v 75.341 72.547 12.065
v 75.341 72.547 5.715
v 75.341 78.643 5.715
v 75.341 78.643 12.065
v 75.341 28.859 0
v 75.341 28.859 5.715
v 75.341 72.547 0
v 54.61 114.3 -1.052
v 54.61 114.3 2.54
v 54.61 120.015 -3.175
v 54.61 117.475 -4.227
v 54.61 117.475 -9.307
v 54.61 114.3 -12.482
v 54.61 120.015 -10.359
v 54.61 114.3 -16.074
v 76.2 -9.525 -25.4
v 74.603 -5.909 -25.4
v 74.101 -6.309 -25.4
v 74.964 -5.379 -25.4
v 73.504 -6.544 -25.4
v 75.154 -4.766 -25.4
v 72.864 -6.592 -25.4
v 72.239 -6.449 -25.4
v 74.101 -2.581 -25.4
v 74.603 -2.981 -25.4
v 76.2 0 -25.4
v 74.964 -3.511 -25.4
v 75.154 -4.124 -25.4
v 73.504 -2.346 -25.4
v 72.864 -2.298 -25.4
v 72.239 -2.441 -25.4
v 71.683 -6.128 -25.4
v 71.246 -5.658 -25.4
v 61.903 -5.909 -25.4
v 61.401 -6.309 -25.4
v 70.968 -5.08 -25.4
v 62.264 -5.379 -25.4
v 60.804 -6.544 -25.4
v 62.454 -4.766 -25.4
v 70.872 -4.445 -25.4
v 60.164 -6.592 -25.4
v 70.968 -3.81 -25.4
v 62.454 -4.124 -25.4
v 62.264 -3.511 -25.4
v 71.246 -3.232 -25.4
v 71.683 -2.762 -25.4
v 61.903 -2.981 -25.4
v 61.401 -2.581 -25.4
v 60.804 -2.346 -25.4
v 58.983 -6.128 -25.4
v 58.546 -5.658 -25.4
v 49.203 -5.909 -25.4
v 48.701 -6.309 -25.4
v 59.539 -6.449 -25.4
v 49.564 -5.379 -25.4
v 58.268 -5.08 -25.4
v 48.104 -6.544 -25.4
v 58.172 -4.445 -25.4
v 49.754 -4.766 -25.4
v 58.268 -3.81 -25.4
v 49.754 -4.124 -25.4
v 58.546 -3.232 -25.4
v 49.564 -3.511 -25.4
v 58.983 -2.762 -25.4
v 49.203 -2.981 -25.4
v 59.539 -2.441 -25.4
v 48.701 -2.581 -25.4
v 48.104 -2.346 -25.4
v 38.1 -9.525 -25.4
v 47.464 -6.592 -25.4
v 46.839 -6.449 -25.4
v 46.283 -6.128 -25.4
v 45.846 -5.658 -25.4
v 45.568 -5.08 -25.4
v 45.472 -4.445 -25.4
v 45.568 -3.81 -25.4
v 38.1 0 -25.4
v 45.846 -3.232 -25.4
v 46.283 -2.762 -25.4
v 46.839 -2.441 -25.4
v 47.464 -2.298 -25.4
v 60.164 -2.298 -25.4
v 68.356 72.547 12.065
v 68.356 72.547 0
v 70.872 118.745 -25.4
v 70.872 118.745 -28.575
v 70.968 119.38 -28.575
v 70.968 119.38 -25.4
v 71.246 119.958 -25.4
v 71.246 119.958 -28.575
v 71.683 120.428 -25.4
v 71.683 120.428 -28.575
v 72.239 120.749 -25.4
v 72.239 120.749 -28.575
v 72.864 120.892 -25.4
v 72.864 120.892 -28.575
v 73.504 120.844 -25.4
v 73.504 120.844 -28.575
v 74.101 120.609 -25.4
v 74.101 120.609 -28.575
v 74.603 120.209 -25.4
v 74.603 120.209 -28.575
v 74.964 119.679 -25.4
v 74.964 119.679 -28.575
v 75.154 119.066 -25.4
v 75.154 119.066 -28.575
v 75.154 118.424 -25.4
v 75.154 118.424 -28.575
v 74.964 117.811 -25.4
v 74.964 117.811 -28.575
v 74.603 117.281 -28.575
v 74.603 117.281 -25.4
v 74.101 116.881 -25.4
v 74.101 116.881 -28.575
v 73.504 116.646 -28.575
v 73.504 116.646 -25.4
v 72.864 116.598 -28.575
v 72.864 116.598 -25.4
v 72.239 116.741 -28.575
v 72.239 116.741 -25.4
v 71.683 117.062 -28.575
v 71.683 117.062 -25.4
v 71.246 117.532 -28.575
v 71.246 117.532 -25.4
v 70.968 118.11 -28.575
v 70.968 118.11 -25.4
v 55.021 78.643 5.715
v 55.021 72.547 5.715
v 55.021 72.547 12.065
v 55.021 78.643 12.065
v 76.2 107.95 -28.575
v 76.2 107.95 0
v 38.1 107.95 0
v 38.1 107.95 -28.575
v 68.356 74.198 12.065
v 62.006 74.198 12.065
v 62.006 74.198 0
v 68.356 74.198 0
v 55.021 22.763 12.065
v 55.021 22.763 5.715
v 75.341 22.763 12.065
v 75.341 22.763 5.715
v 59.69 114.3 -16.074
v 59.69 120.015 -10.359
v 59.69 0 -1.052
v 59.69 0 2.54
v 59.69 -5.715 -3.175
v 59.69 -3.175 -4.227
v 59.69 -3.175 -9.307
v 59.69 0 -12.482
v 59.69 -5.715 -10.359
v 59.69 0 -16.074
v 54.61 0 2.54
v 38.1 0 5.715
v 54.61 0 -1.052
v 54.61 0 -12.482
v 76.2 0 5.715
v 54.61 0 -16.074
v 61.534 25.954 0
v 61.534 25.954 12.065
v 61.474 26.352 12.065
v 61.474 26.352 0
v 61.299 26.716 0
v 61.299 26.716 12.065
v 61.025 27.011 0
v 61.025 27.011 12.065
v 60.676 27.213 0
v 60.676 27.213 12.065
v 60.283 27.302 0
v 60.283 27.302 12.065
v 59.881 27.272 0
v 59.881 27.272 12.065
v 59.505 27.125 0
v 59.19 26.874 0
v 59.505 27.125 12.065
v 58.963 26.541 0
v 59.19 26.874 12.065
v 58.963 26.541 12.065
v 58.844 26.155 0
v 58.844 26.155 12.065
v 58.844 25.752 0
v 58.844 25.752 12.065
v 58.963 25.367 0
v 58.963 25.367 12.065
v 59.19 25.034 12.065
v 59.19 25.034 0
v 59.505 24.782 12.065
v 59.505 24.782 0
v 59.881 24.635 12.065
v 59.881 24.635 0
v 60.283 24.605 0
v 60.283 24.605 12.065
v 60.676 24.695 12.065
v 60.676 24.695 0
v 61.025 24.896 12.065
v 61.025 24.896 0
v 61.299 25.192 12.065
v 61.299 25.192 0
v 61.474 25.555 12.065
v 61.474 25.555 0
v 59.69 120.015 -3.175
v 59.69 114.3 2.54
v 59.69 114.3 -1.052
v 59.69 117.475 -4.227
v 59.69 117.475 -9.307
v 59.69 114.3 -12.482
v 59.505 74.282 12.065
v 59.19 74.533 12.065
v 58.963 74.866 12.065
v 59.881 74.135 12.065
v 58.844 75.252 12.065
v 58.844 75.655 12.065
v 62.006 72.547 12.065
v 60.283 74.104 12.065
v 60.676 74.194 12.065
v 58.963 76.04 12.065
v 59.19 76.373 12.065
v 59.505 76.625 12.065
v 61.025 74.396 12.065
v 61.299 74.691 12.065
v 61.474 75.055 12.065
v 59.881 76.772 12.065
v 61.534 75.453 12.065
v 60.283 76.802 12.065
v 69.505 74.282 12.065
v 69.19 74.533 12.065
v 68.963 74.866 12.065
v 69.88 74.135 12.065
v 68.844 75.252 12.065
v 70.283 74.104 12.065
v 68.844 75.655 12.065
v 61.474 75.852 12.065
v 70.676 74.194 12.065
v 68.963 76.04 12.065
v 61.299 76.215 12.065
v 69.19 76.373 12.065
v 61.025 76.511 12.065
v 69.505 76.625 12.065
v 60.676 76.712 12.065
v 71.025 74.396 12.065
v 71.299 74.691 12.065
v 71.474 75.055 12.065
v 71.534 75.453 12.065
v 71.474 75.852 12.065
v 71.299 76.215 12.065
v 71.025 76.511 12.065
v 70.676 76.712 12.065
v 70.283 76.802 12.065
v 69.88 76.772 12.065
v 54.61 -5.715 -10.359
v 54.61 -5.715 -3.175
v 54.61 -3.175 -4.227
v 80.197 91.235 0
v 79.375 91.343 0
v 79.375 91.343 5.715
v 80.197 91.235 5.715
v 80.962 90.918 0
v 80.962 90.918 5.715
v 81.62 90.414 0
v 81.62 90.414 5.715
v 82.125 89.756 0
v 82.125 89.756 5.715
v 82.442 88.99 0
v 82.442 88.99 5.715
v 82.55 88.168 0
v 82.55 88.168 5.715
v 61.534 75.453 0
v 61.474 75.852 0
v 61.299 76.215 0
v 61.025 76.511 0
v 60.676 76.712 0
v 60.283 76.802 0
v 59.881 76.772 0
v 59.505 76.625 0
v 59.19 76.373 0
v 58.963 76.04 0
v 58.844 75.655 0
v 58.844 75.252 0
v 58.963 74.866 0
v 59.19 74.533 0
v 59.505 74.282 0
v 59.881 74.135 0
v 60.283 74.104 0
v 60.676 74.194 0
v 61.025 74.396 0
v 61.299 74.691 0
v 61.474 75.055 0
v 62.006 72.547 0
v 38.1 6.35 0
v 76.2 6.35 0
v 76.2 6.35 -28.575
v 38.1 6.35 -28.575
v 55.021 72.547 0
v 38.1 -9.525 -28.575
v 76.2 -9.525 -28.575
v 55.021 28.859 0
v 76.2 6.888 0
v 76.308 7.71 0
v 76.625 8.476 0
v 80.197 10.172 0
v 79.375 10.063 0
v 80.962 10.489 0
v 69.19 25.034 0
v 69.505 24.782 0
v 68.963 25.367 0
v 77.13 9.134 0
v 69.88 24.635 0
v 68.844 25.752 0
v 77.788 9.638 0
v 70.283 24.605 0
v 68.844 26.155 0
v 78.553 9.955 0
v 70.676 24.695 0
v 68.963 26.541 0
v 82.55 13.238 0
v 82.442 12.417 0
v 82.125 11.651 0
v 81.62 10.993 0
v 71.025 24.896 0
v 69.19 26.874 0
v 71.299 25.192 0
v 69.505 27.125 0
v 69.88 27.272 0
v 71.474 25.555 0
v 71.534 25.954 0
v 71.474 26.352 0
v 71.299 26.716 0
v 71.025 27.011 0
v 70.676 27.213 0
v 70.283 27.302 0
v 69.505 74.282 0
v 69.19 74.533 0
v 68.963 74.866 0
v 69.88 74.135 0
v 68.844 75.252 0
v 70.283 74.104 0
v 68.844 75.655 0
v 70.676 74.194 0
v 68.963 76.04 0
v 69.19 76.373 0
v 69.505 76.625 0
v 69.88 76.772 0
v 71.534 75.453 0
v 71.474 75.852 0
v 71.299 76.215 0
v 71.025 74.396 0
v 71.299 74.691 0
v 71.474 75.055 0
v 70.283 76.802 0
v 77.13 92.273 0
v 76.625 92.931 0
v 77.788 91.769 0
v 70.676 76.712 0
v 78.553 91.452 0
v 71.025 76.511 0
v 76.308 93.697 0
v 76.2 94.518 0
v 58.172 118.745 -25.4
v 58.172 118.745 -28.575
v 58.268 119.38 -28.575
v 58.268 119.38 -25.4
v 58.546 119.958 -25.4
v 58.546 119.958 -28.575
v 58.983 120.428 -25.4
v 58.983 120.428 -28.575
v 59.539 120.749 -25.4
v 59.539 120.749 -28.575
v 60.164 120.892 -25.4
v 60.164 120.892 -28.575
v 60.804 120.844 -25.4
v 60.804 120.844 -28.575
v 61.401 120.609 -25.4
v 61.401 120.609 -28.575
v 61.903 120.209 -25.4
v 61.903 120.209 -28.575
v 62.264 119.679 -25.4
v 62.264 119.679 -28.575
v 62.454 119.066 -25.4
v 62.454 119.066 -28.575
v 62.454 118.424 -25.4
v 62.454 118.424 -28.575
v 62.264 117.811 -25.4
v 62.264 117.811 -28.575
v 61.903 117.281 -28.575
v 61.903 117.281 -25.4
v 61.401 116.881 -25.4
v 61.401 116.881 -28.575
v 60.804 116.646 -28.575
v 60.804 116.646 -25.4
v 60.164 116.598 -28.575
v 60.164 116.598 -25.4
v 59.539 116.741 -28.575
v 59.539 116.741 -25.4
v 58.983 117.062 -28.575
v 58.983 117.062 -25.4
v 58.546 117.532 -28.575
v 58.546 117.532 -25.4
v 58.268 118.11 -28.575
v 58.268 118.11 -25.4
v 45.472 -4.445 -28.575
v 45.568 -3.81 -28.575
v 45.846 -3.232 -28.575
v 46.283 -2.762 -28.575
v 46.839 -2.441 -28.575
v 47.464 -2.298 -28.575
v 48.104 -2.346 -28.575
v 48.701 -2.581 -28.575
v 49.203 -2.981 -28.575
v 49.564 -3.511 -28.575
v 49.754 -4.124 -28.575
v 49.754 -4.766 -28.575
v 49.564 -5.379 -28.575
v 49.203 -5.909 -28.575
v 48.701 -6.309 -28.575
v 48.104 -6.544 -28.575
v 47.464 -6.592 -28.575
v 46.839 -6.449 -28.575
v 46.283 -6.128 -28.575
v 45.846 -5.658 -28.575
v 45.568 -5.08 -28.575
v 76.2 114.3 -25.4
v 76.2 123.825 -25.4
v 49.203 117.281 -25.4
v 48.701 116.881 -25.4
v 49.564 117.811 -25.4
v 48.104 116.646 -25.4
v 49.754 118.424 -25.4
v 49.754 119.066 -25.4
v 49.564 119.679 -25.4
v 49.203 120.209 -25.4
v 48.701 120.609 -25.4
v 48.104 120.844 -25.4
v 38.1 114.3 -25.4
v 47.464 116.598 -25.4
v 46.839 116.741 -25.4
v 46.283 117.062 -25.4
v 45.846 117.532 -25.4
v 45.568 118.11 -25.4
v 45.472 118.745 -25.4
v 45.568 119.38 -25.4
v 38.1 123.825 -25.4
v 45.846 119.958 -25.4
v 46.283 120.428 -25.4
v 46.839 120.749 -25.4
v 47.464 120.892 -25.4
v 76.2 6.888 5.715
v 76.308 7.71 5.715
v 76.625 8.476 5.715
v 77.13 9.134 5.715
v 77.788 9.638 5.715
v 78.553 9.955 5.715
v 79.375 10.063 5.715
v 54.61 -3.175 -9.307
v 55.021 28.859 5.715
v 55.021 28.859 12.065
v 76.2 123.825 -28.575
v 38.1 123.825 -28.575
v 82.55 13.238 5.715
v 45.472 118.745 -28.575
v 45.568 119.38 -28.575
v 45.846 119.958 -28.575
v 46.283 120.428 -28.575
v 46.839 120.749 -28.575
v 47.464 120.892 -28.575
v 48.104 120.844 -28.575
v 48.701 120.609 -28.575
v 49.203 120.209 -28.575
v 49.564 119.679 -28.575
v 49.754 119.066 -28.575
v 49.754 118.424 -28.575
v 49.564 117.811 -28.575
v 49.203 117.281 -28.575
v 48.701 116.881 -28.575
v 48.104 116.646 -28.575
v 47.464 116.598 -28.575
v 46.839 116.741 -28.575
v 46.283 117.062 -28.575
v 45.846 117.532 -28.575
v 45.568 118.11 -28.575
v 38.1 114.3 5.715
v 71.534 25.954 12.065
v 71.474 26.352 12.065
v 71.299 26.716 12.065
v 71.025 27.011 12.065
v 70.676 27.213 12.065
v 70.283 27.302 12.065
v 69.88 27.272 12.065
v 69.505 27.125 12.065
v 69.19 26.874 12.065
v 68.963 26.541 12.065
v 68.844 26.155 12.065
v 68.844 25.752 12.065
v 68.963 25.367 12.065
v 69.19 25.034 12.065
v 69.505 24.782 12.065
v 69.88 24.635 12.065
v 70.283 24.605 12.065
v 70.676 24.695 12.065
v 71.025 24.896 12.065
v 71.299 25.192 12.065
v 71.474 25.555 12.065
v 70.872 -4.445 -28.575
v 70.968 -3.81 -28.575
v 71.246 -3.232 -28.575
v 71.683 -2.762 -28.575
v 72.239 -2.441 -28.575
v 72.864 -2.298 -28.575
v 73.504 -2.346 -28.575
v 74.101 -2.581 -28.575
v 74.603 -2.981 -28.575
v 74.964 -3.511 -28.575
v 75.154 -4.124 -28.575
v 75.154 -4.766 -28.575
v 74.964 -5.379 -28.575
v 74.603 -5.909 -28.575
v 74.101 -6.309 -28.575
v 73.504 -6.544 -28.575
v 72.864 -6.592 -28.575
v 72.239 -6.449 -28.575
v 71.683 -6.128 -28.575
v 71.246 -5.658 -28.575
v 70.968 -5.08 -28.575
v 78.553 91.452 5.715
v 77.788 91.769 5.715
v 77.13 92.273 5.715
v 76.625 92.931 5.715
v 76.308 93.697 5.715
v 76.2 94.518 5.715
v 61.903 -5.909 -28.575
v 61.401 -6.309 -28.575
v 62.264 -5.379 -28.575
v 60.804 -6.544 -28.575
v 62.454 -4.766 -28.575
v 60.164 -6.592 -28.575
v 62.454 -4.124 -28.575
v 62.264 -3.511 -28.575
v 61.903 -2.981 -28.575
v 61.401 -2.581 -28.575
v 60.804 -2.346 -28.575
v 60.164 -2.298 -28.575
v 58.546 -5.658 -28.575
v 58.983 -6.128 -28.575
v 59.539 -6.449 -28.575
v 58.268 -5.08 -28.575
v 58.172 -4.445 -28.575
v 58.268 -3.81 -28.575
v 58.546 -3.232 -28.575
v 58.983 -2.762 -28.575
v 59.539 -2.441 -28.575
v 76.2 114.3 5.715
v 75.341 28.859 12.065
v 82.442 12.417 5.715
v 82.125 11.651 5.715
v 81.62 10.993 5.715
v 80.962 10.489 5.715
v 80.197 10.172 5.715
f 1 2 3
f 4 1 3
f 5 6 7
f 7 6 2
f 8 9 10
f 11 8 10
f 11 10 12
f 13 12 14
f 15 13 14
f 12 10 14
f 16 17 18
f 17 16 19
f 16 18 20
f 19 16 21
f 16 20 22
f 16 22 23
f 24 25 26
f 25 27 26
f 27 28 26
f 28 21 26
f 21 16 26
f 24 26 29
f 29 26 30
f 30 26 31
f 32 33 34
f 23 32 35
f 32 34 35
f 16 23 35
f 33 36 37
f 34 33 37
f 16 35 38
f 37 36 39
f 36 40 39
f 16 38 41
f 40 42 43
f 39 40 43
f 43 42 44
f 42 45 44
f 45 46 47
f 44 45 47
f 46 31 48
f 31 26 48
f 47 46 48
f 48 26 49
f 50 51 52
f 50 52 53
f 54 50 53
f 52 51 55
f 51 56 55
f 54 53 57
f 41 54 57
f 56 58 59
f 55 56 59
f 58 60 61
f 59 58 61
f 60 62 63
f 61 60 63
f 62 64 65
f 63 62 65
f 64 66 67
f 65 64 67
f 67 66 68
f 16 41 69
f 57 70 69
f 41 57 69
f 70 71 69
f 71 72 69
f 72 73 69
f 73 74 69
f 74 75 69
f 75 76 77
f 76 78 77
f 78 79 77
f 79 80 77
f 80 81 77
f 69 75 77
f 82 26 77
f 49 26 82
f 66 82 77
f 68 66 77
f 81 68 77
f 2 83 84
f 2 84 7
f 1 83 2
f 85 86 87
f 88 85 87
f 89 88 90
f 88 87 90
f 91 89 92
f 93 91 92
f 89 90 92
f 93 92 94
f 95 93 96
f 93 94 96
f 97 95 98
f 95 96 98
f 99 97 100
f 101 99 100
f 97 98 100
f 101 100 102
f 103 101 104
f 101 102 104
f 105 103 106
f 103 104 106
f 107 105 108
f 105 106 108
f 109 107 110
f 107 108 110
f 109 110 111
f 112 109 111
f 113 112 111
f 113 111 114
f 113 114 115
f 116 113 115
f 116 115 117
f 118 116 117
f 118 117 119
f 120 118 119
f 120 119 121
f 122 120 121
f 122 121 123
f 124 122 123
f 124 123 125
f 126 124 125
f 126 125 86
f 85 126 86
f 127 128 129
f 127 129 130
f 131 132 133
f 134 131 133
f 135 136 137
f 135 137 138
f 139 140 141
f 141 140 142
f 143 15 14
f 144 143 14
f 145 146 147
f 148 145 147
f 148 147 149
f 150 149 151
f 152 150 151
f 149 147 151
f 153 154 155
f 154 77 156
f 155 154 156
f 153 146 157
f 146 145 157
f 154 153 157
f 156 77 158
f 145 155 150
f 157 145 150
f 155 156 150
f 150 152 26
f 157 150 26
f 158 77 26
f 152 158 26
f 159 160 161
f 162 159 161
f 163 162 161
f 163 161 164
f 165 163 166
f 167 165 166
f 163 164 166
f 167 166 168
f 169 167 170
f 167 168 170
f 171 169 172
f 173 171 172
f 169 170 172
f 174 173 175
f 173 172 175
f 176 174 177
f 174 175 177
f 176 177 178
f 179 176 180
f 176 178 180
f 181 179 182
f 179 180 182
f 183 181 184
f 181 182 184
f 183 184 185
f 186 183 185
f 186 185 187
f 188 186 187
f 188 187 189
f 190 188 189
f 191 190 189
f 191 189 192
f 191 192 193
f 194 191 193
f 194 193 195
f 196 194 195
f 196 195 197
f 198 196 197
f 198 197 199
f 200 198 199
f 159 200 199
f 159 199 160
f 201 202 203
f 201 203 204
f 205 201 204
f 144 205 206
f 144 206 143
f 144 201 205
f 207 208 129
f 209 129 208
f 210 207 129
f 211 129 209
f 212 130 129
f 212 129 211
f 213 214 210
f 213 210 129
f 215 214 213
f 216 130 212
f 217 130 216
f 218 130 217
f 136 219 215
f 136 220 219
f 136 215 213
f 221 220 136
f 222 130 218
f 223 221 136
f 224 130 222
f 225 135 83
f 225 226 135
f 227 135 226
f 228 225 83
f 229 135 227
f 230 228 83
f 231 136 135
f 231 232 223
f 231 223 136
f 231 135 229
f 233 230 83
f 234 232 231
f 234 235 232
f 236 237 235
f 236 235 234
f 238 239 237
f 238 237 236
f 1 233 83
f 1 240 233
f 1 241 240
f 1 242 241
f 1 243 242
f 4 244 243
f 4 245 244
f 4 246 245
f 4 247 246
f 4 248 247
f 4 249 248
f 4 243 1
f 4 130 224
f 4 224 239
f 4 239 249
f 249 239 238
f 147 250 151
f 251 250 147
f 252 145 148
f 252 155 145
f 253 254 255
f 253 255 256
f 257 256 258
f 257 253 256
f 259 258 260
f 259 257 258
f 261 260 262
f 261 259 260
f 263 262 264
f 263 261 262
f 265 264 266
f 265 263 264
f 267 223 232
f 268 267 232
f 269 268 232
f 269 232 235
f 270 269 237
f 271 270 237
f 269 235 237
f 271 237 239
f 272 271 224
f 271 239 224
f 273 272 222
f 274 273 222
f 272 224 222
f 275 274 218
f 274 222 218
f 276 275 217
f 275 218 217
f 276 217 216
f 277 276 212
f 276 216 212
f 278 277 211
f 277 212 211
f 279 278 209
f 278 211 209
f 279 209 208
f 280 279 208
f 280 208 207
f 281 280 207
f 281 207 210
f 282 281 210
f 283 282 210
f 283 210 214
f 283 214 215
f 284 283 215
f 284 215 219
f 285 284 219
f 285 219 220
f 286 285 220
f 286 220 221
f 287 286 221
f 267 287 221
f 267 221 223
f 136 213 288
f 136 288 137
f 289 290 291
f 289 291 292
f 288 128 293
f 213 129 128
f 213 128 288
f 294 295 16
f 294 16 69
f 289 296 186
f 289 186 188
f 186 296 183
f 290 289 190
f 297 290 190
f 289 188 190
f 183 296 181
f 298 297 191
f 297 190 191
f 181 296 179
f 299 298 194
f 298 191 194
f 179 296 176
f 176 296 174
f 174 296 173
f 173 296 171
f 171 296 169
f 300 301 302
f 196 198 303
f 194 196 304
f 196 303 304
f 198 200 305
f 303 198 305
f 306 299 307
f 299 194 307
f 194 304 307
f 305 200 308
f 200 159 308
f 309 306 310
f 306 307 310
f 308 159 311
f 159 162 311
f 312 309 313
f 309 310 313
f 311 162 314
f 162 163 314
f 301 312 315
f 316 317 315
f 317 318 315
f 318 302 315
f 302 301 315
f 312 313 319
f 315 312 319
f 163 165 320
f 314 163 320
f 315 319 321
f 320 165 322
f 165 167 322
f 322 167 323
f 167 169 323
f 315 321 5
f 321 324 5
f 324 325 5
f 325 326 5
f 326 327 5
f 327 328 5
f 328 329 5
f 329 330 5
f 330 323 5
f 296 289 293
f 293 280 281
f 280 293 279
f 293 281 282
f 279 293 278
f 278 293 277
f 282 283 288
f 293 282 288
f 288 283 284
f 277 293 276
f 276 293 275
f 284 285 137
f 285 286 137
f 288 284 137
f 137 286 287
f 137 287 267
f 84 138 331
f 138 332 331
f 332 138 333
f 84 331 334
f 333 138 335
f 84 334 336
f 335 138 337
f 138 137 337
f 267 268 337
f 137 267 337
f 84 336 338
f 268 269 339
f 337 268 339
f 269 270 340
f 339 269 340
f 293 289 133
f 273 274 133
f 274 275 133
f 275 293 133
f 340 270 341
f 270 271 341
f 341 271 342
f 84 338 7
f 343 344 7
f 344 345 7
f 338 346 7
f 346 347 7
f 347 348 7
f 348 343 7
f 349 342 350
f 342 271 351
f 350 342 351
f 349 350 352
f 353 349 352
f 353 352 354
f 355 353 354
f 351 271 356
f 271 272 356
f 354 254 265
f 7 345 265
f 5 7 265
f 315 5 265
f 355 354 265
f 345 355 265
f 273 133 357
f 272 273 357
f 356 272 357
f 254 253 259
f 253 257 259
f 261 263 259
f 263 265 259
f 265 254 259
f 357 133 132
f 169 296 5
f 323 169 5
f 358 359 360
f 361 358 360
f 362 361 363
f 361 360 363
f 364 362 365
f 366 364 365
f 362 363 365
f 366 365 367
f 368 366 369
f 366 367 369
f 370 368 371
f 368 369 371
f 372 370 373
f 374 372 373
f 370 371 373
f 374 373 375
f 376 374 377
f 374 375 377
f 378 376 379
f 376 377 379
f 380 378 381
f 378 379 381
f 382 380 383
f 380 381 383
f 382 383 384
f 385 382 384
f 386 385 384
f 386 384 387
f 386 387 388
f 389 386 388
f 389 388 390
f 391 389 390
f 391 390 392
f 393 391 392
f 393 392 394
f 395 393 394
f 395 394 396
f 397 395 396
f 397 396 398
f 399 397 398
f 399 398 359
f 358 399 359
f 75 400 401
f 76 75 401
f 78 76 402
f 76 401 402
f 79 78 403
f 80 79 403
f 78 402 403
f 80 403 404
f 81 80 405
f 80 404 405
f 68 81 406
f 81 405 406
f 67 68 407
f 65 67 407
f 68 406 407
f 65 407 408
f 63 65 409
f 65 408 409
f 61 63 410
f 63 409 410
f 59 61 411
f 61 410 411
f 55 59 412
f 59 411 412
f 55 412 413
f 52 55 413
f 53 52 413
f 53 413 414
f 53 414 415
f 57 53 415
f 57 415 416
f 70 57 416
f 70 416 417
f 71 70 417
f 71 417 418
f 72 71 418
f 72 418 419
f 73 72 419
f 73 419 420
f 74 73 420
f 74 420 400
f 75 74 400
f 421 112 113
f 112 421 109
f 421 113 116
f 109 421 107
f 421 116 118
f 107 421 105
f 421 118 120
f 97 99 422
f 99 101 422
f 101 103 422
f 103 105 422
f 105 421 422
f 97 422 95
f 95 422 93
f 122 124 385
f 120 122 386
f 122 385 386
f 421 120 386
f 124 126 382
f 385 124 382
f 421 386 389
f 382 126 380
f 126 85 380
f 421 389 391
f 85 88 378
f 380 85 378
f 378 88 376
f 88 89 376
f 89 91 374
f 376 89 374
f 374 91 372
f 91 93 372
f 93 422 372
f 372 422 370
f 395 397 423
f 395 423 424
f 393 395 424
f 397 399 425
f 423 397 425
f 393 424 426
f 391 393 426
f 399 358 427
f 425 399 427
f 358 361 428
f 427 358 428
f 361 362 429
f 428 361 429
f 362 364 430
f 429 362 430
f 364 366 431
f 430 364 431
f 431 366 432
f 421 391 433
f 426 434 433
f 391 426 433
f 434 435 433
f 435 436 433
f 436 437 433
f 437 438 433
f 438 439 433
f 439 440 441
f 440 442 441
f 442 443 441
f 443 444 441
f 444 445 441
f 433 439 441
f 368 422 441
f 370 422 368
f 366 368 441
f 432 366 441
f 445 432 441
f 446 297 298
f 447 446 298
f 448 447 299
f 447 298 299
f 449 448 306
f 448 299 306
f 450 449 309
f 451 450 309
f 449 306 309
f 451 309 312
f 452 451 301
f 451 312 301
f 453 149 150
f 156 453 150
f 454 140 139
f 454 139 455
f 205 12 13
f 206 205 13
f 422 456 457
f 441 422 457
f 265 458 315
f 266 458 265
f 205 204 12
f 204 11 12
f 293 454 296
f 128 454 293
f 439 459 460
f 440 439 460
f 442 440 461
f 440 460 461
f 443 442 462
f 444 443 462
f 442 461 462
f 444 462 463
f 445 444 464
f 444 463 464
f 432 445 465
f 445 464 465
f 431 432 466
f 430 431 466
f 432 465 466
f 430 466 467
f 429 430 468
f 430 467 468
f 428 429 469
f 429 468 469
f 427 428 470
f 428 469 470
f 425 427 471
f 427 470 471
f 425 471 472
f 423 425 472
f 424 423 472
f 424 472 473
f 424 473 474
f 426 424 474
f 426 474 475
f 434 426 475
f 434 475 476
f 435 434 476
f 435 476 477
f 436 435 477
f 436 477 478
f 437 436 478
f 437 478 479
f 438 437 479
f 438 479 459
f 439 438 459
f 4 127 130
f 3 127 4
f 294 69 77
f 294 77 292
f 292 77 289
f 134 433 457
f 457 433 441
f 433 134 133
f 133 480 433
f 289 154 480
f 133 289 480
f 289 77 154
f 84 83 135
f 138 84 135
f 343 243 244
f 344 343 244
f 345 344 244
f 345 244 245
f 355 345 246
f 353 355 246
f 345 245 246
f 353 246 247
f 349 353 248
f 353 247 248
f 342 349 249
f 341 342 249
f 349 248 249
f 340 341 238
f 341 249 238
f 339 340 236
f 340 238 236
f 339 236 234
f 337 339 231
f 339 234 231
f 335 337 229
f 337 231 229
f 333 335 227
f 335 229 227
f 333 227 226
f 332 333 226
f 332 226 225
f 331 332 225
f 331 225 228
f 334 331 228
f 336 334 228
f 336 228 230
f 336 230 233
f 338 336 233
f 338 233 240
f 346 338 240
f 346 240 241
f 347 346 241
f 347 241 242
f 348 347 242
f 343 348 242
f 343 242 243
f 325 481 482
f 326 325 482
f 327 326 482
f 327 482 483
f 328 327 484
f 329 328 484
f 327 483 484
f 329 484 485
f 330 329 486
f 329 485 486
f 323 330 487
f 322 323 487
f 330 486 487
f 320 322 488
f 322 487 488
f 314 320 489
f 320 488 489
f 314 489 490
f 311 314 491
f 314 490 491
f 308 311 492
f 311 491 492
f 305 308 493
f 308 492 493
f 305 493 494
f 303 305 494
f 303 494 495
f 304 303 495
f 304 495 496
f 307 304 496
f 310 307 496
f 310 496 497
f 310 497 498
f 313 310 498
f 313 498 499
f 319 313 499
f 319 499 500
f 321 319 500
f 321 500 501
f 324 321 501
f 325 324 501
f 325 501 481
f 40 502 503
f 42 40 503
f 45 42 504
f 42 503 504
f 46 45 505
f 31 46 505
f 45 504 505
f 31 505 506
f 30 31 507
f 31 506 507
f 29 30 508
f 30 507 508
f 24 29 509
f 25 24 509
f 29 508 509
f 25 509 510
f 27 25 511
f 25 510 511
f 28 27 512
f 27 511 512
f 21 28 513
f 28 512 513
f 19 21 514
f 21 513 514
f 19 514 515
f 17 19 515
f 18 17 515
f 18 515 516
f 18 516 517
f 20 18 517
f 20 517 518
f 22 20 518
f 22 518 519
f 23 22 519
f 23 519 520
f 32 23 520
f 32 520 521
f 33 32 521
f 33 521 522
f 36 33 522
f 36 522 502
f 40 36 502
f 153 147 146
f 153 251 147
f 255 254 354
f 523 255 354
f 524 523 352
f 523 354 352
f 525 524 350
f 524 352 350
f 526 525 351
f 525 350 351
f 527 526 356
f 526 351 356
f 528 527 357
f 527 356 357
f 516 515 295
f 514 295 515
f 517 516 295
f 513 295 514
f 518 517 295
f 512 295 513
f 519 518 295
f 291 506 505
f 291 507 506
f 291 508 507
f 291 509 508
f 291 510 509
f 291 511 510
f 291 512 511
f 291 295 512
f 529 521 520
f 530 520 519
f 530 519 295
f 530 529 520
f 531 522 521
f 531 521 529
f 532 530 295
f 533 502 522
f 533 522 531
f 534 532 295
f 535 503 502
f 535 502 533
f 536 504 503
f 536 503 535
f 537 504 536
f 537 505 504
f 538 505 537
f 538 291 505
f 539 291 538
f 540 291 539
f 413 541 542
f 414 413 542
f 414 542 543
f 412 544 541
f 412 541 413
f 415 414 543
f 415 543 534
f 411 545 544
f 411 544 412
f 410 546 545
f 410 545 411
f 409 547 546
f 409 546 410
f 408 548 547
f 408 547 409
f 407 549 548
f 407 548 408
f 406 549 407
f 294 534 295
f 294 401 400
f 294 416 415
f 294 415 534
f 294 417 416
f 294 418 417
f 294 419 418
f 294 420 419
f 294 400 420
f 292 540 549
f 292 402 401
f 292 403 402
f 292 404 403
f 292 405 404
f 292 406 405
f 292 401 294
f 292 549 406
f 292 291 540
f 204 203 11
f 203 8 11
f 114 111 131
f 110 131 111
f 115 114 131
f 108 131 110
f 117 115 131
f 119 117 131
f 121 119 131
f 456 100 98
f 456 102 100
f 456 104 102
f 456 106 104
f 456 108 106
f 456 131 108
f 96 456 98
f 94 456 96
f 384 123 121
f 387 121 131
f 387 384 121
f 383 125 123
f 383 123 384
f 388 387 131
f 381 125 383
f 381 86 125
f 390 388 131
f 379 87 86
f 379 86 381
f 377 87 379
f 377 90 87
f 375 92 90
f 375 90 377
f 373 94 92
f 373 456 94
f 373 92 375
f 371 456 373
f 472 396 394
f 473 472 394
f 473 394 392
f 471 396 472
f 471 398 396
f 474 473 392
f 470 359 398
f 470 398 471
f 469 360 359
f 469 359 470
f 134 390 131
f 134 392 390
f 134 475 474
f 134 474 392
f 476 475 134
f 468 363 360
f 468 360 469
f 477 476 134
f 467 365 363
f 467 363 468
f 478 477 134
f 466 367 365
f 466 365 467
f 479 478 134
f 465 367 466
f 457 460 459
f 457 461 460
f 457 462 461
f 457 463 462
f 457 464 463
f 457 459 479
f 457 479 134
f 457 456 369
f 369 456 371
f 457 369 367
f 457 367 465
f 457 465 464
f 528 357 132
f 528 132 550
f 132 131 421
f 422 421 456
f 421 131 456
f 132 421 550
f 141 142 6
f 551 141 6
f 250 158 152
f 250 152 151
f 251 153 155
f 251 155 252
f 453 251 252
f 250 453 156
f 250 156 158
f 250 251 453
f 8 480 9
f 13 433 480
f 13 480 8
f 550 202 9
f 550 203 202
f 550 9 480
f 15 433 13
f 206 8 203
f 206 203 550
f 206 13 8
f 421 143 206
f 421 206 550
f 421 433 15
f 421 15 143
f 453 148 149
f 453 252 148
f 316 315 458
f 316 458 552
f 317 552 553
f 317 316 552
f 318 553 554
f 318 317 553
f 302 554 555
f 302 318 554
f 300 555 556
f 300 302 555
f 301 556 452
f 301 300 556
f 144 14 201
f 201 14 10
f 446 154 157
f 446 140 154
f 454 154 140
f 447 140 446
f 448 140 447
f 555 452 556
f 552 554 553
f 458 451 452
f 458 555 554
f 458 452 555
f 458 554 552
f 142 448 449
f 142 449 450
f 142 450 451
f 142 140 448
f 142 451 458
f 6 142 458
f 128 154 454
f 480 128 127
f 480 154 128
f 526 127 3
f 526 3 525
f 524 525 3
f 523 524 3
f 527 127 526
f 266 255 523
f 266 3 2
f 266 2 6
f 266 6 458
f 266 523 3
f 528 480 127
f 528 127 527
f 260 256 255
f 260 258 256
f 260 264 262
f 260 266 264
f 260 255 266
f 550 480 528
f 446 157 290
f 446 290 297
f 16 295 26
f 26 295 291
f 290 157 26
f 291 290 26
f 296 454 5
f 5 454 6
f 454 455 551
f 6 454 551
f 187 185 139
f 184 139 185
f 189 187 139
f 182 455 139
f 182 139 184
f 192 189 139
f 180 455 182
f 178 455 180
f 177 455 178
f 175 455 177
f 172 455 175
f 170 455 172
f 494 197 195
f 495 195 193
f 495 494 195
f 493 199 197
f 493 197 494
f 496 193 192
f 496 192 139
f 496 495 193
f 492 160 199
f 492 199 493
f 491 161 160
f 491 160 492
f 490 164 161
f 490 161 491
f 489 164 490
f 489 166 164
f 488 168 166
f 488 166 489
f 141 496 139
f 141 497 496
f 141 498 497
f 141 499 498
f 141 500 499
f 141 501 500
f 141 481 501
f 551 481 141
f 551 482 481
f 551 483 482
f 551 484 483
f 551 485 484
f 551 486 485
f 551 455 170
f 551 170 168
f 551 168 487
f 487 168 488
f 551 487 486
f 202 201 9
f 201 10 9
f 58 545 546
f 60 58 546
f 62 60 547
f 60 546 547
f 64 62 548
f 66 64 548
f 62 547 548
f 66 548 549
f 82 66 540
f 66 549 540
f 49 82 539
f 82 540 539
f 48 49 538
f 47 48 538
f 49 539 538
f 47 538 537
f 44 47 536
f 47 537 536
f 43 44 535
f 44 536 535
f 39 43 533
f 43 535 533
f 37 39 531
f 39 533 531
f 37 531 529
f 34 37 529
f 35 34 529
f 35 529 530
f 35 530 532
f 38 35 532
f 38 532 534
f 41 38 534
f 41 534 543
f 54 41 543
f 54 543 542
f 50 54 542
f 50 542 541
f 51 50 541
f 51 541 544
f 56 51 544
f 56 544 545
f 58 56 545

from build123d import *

# Parameters (mm, degrees)
SKETCH1_W             = 76.2
SKETCH1_H             = 114.3
BOSS_EXTRUDE1_DEPTH   = 2.54
SKETCH2_W             = 20.32
SKETCH2_H             = 41.91
CUT_EXTRUDE1_DEPTH    = 138.394983897
SKETCH3_W             = 76.2
SKETCH3_H             = 6.35
BOSS_EXTRUDE2_DEPTH   = 28.575
SKETCH4_W             = 76.2
SKETCH4_H             = 9.525
BOSS_EXTRUDE3_DEPTH   = 3.175
F_6_CLEARANCE_HOLE1_D = 4.3053
SKETCH9_W             = 76.2
SKETCH9_H             = 114.3
SKETCH9_W_2           = 20.32
SKETCH9_H_2           = 41.91
BOSS_EXTRUDE4_DEPTH   = 3.175
SKETCH10_W            = 38.1
SKETCH10_H            = 133.35
CUT_EXTRUDE3_DEPTH    = 150.381641191
SKETCH11_W            = 20.32
SKETCH11_H            = 6.985
BOSS_EXTRUDE5_DEPTH   = 6.35
F_6_32_TAPPED_HOLE1_D = 2.7051
SKETCH15_W            = 6.35
SKETCH15_H            = 2.54
CUT_EXTRUDE4_DEPTH    = 151.965824692
SKETCH16_W            = 20.32
SKETCH16_H            = 43.688
CUT_EXTRUDE5_DEPTH    = 151.965824692
SKETCH17_W            = 6.35
SKETCH17_H            = 81.28
BOSS_EXTRUDE6_DEPTH   = 5.715
FILLET1_START         = -28.575
FILLET1_DEPTH         = 35.575
FILLET1_2_DEPTH       = 5.715
BOSS_EXTRUDE7_START   = -19.05
BOSS_EXTRUDE7_DEPTH   = 2.54


with BuildPart() as part:
    # Sketch1 → Boss-Extrude1 (new body)
    with BuildSketch(Plane.XY):
        with Locations((38.1, 57.15)):
            Rectangle(SKETCH1_W, SKETCH1_H)
    extrude(amount=BOSS_EXTRUDE1_DEPTH)

    # Sketch2 → Cut-Extrude1 (cut, through all)
    with BuildSketch(Plane.XY.offset(2.54)):
        with Locations((65.18148, 50.70348)):
            Rectangle(SKETCH2_W, SKETCH2_H)
    extrude(amount=-CUT_EXTRUDE1_DEPTH, mode=Mode.SUBTRACT)

    # Sketch3 → Boss-Extrude2 (add)
    with BuildSketch(Plane(origin=(0, 0, 0), x_dir=(-1, 0, 0), z_dir=(0, 0, -1))):
        with Locations((-38.1, 111.125)):
            Rectangle(SKETCH3_W, SKETCH3_H)
        with Locations((-38.1, 3.175)):
            Rectangle(SKETCH3_W, SKETCH3_H)
    extrude(amount=BOSS_EXTRUDE2_DEPTH)

    # Sketch4 → Boss-Extrude3 (add)
    with BuildSketch(Plane(origin=(0, 0, -28.575), x_dir=(-1, 0, 0), z_dir=(0, 0, -1))):
        with Locations((-38.1, 119.0625)):
            Rectangle(SKETCH4_W, SKETCH4_H)
        with Locations((-38.1, -4.7625)):
            Rectangle(SKETCH4_W, SKETCH4_H)
    extrude(amount=-BOSS_EXTRUDE3_DEPTH)

    # #6 Clearance Hole1 (through all)
    with Locations(Plane.XY.offset(-25.4)):
        with Locations((9.525, 118.745), (9.525, -4.445), (22.225, -4.445), (34.925, -4.445), (47.625, -4.445), (60.325, -4.445), (22.225, 118.745), (73.025, -4.445), (34.925, 118.745), (47.625, 118.745), (60.325, 118.745), (73.025, 118.745)):
            Hole(F_6_CLEARANCE_HOLE1_D / 2)

    # Sketch9 → Boss-Extrude4 (add)
    with BuildSketch(Plane.XY.offset(2.54)):
        with Locations((38.1, 57.15)):
            Rectangle(SKETCH9_W, SKETCH9_H)
        with Locations((65.18148, 50.70348)):
            Rectangle(SKETCH9_W_2, SKETCH9_H_2, mode=Mode.SUBTRACT)
    extrude(amount=BOSS_EXTRUDE4_DEPTH)

    # Sketch10 → Cut-Extrude3 (cut, through all)
    with BuildSketch(Plane.XY.offset(5.715)):
        with Locations((19.05, 57.15)):
            Rectangle(SKETCH10_W, SKETCH10_H)
    extrude(amount=-CUT_EXTRUDE3_DEPTH, mode=Mode.SUBTRACT)

    # Sketch11 → Boss-Extrude5 (add)
    with BuildSketch(Plane.XY.offset(5.715)):
        with Locations((65.18148, 75.15098)):
            Rectangle(SKETCH11_W, SKETCH11_H)
        with Locations((65.18148, 26.25598)):
            Rectangle(SKETCH11_W, SKETCH11_H)
    extrude(amount=BOSS_EXTRUDE5_DEPTH)

    # #6-32 Tapped Hole1 (through all)
    with Locations(Plane(origin=(0, 0, 0), x_dir=(-1, 0, 0), z_dir=(0, 0, -1))):
        with Locations((-70.18147, 75.45324), (-60.18149, 75.45324), (-60.18149, 25.95372), (-70.18147, 25.95372)):
            Hole(F_6_32_TAPPED_HOLE1_D / 2)

    # Sketch15 → Cut-Extrude4 (cut, through all)
    with BuildSketch(Plane.XY.offset(12.065)):
        with Locations((65.18148, 72.92848)):
            Rectangle(SKETCH15_W, SKETCH15_H)
    extrude(amount=-CUT_EXTRUDE4_DEPTH, mode=Mode.SUBTRACT)

    # Sketch16 → Cut-Extrude5 (cut, through all)
    with BuildSketch(Plane.XY.offset(12.065)):
        with Locations((65.18148, 50.70348)):
            Rectangle(SKETCH16_W, SKETCH16_H)
    extrude(amount=-CUT_EXTRUDE5_DEPTH, mode=Mode.SUBTRACT)

    # Sketch17 → Boss-Extrude6 (add)
    with BuildSketch(Plane.XY.offset(5.715)):
        with Locations((79.375, 50.70348)):
            Rectangle(SKETCH17_W, SKETCH17_H)
    extrude(amount=-BOSS_EXTRUDE6_DEPTH)

    # Fillet1: read off the stored shape, not the designer's step
    # Fillet1 outline → Fillet1 (cut)
    with BuildSketch(Plane.XY.offset(FILLET1_START)):
        with BuildLine():
            ThreePointArc((79.375, 91.34348), (81.62006403, 90.41354403), (82.55, 88.16848))
            Line((82.55, 88.16848), (82.55, 91.34348))
            Line((82.55, 91.34348), (79.375, 91.34348))
        make_face()
        with BuildLine():
            ThreePointArc((82.55, 13.23848), (81.62006403, 10.99341597), (79.375, 10.06348))
            Line((79.375, 10.06348), (82.55, 10.06348))
            Line((82.55, 10.06348), (82.55, 13.23848))
        make_face()
    extrude(amount=FILLET1_DEPTH, mode=Mode.SUBTRACT)

    # Fillet1 2 outline → Fillet1 2 (add)
    with BuildSketch(Plane.XY):
        with BuildLine():
            Line((76.2, 91.34348), (79.375, 91.34348))
            ThreePointArc((79.375, 91.34348), (77.12993597, 92.27341597), (76.2, 94.51848))
            Line((76.2, 94.51848), (76.2, 91.34348))
        make_face()
        with BuildLine():
            ThreePointArc((76.2, 6.88848), (77.12993597, 9.13354403), (79.375, 10.06348))
            Line((79.375, 10.06348), (76.2, 10.06348))
            Line((76.2, 10.06348), (76.2, 6.88848))
        make_face()
    extrude(amount=FILLET1_2_DEPTH)

    # Sketch18 → Boss-Extrude7 (add, symmetric)
    with BuildSketch(Plane.ZY.offset(-38.1).offset(BOSS_EXTRUDE7_START)):
        Polygon((-16.074204897, 114.3), (-10.359204897, 120.015), (-3.175, 120.015), (2.54, 114.3), (-1.052102448, 114.3), (-4.227102448, 117.475), (-9.307102448, 117.475), (-12.482102448, 114.3), align=None)
    boss_extrude7 = extrude(amount=BOSS_EXTRUDE7_DEPTH, both=True)

    # Mirror1: Boss-Extrude7 across plane
    add(boss_extrude7.mirror(Plane.ZX.offset(57.15)))


solid = part.part
